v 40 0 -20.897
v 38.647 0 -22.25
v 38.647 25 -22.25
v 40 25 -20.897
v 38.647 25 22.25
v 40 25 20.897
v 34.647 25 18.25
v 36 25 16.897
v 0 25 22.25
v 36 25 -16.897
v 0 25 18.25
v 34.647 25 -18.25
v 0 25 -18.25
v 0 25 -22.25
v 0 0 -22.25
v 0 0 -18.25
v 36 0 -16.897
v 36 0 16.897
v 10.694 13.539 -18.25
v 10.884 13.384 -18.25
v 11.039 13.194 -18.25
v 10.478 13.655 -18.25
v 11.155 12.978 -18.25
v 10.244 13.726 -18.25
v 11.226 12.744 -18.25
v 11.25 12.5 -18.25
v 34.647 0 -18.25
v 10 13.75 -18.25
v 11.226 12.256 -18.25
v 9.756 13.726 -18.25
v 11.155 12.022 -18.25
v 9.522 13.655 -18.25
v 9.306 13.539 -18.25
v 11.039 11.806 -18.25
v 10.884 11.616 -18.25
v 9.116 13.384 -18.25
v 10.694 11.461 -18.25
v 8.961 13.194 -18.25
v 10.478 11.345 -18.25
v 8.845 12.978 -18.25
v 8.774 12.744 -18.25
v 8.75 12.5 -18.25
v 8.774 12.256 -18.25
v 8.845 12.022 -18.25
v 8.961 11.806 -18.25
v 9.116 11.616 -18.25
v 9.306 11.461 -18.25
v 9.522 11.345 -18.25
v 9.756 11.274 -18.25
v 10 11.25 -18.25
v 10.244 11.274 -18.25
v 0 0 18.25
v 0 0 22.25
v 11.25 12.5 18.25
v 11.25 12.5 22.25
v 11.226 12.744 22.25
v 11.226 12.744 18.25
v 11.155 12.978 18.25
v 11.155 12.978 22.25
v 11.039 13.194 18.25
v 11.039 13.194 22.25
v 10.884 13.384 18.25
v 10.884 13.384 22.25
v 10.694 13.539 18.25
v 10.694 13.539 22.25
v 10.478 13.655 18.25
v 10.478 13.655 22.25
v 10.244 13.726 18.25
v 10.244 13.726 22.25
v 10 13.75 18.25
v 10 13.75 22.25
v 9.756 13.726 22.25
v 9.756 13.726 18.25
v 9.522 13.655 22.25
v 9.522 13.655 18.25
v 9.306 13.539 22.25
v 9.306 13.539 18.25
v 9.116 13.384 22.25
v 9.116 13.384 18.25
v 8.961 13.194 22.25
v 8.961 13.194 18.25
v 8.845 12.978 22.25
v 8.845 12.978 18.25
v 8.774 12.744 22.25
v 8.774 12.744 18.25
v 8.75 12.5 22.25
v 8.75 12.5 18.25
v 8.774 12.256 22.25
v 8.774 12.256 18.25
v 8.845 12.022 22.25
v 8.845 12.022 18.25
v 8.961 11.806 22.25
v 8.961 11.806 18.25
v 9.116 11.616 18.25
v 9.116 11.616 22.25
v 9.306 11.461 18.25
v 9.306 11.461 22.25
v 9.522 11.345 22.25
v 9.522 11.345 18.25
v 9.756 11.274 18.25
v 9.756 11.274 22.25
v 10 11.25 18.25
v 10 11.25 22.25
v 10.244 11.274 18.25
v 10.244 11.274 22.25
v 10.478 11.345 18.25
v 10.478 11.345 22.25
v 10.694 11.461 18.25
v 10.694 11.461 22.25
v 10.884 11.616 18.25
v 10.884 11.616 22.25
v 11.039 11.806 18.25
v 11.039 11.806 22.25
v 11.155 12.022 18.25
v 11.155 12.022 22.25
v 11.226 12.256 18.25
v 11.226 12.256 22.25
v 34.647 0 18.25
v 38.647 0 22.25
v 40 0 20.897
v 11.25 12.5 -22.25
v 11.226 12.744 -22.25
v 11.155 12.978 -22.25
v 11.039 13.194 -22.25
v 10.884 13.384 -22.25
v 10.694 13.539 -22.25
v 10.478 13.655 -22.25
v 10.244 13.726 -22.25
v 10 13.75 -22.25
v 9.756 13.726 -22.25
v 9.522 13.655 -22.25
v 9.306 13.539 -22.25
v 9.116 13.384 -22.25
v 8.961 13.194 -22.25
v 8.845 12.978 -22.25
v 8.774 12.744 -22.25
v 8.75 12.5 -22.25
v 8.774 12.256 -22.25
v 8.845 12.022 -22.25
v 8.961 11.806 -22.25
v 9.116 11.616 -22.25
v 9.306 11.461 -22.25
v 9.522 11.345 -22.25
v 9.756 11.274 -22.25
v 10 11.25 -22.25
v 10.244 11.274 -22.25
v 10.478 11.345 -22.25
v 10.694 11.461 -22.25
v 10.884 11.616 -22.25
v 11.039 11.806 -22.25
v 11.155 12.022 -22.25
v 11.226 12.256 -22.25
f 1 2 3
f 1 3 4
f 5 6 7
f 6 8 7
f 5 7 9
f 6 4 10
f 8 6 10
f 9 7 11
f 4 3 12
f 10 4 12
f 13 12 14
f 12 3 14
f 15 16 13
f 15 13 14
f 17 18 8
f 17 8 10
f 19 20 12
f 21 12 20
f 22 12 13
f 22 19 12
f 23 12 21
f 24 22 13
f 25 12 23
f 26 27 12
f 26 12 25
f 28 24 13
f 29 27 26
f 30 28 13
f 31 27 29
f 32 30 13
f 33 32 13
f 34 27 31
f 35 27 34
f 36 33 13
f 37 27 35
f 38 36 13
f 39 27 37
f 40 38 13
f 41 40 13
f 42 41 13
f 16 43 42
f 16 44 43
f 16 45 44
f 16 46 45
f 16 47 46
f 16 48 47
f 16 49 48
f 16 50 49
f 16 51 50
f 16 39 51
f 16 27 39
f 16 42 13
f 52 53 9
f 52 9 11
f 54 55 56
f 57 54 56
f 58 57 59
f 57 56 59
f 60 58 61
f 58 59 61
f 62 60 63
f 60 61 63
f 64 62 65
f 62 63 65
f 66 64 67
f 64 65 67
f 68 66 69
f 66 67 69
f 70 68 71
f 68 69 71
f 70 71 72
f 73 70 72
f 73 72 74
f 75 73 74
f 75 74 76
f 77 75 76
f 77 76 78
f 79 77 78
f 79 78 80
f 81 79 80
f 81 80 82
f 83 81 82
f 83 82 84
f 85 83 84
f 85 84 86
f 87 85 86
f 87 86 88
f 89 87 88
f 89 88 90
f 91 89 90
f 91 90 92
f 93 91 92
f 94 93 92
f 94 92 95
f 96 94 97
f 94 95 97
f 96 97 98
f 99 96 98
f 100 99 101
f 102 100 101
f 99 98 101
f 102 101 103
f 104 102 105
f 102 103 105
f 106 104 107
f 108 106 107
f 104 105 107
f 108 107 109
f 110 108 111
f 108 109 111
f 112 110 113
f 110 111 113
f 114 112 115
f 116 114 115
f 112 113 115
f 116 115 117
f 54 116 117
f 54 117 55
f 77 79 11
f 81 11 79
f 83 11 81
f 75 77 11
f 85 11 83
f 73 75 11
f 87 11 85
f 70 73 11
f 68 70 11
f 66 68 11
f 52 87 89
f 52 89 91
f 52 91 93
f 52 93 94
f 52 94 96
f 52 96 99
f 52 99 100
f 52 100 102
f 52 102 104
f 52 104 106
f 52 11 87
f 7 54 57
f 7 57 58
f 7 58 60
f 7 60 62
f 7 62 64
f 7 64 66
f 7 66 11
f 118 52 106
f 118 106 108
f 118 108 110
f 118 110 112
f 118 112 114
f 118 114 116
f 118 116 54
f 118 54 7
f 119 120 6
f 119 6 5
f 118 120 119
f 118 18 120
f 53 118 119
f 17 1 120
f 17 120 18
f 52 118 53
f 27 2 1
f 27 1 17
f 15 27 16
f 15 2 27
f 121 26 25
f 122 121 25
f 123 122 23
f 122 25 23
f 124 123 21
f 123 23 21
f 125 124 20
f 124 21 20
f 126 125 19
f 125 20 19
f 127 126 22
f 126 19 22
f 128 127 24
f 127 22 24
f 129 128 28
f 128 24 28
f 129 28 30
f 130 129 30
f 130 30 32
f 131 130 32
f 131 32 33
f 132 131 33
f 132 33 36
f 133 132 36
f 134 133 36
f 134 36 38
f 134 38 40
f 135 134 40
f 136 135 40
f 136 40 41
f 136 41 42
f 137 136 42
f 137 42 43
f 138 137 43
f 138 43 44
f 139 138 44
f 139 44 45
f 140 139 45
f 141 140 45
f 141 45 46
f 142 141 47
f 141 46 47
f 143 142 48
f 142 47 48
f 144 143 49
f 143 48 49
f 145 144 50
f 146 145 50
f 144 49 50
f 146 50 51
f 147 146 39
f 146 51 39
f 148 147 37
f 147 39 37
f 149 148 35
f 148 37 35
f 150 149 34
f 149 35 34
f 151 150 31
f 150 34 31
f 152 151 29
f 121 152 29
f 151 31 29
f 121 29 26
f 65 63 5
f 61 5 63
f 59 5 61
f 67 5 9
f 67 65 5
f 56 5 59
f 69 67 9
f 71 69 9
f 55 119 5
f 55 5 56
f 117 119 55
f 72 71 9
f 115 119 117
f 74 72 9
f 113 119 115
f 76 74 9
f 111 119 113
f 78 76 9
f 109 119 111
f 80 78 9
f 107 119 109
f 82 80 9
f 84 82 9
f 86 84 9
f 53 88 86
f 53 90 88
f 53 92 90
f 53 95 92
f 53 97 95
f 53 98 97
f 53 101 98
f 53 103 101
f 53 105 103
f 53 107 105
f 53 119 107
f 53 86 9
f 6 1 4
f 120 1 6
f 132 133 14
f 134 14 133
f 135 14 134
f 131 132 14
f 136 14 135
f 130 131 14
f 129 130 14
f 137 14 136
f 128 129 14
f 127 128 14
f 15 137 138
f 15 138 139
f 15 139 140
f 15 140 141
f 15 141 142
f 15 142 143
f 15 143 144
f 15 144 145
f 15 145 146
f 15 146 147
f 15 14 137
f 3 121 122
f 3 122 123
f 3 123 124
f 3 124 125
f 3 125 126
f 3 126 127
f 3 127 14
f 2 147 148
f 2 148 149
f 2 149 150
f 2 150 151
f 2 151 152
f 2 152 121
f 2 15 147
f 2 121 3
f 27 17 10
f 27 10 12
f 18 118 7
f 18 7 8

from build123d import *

# Parameters (mm, degrees)
BOSS_EXTRUDE2_DEPTH = 25
SKETCH6_R           = 1.25
CUT_EXTRUDE1_DEPTH  = 65.847898964


with BuildPart() as part:
    # Sketch3 → Boss-Extrude2 (new body)
    with BuildSketch(Plane(origin=(0, 0, 0), x_dir=(1, 0, 0), z_dir=(0, 1, 0))):
        Polygon((0, 18.25), (0, 22.25), (38.64701272, 22.25), (40, 20.89701272), (40, -20.89701272), (38.64701272, -22.25), (0, -22.25), (0, -18.25), (34.64701272, -18.25), (36, -16.89701272), (36, 16.89701272), (34.64701272, 18.25), align=None)
    extrude(amount=BOSS_EXTRUDE2_DEPTH)

    # Sketch6 → Cut-Extrude1 (cut, through all)
    with BuildSketch(Plane.XY.offset(22.25)):
        with Locations((10, 12.5)):
            Circle(SKETCH6_R)
    extrude(amount=-CUT_EXTRUDE1_DEPTH, mode=Mode.SUBTRACT)


solid = part.part
